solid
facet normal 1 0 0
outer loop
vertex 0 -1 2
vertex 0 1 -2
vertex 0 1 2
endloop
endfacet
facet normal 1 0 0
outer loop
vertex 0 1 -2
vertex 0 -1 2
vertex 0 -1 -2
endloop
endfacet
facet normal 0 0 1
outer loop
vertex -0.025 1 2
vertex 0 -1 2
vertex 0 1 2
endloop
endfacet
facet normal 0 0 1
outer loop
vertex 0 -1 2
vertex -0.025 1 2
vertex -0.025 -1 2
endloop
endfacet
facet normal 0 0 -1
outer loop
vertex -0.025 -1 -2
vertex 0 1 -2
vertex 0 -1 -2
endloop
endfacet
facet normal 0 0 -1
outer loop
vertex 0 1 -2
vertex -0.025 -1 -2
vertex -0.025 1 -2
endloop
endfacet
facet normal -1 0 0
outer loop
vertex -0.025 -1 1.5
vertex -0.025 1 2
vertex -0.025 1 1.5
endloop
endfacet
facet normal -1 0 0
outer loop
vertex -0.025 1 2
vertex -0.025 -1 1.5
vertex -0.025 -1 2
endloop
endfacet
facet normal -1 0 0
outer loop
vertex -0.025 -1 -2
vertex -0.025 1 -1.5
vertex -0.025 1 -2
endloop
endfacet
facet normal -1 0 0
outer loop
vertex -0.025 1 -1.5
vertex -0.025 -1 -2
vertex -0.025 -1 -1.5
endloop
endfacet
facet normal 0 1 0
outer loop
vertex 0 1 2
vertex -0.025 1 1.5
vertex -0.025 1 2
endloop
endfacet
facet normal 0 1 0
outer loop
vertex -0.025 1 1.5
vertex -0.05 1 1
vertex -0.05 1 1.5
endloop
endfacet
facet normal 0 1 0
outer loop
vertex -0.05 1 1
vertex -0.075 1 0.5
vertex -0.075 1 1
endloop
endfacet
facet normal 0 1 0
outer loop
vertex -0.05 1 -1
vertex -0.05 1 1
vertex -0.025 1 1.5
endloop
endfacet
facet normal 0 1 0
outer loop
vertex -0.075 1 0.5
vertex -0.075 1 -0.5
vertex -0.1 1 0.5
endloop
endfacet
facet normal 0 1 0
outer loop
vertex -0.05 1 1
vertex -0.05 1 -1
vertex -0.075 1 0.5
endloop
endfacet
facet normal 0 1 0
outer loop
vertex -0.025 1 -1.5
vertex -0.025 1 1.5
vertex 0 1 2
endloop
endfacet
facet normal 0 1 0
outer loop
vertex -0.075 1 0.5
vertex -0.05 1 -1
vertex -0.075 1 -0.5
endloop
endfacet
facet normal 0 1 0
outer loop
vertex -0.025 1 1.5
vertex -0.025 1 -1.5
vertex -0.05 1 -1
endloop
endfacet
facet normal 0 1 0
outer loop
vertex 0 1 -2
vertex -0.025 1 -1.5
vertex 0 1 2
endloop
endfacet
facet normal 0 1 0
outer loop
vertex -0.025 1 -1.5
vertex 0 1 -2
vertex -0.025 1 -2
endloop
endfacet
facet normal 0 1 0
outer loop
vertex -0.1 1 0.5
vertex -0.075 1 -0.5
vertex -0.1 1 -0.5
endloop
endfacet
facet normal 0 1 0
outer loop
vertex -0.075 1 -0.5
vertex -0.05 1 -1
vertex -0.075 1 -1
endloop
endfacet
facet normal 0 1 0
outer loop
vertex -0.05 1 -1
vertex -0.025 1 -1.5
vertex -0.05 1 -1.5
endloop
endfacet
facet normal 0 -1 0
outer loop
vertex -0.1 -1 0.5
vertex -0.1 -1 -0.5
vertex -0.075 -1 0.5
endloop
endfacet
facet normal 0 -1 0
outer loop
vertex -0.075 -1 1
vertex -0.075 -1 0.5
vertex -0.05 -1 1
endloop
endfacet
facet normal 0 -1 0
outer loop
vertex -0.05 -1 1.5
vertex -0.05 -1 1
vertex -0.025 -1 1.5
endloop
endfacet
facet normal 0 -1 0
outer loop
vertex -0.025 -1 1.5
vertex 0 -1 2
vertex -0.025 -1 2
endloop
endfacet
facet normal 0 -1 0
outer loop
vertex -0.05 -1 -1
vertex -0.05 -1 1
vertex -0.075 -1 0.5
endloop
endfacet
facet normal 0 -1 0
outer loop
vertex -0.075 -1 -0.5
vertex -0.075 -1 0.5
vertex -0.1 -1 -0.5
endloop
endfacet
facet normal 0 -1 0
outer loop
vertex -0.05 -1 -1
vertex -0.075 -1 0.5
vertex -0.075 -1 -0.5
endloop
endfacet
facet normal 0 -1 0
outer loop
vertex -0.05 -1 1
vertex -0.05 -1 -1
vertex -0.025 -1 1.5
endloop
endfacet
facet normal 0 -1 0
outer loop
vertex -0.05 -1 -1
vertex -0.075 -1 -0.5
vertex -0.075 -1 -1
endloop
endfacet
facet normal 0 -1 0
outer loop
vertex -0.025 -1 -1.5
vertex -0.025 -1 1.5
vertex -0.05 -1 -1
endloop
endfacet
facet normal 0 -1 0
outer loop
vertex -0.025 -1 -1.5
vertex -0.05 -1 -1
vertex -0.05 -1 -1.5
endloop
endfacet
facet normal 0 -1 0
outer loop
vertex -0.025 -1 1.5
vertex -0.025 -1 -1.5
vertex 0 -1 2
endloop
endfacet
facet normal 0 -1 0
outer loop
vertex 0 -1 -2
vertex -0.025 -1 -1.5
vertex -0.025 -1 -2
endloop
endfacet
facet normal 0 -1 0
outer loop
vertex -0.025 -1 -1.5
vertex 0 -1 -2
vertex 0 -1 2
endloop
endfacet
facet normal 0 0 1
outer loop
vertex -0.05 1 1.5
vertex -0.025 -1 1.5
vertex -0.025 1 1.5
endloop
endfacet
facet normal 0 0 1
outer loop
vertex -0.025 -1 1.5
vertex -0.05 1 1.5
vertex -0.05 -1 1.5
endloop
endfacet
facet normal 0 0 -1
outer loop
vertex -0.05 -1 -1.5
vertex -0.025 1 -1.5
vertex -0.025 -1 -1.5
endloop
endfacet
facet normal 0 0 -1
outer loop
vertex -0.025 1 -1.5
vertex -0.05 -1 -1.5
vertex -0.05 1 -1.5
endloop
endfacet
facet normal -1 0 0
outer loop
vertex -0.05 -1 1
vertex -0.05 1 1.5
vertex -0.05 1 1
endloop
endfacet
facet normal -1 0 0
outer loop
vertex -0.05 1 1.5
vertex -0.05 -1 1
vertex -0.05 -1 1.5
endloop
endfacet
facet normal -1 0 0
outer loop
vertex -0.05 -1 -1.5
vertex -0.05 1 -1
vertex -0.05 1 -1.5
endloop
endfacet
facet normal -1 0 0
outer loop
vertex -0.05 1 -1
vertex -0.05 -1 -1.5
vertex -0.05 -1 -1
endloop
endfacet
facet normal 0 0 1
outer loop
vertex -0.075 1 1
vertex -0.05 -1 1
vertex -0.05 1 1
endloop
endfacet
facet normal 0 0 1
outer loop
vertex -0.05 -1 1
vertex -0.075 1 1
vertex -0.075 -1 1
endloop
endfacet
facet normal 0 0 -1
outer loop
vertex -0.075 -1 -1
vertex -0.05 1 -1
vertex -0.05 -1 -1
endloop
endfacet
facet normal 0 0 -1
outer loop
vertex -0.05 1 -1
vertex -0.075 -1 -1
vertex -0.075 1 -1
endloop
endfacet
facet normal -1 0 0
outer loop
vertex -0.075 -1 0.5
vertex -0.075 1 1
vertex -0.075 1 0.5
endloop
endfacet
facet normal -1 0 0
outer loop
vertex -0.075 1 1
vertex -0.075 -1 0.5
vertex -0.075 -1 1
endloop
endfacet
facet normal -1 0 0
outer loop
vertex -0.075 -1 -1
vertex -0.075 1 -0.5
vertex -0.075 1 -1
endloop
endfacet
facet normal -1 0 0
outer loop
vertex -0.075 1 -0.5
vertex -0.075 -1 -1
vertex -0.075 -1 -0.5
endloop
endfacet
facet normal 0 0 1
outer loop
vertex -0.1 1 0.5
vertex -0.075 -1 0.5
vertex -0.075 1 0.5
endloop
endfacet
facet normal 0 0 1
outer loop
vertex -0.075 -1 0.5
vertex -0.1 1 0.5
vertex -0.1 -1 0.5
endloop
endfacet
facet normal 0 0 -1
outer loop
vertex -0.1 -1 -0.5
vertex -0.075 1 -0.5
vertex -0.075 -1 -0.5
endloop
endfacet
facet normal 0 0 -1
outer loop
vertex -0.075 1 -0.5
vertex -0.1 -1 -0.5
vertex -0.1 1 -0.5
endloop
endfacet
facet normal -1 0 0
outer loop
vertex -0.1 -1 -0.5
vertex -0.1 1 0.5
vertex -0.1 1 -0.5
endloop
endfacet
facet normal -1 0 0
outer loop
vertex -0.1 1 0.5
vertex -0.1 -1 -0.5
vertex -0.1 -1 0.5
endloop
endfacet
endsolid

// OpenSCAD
dx=0.1; //cm
 scale([0.25,1,1]) union() {
translate([-dx/2,0,0])
    cube([dx,2.0,4.0],center=true);
translate([-3*dx/2,0,0])
    cube([dx,2.0,3.0],center=true);
translate([-5*dx/2,0,0])
    cube([dx,2.0,2.0],center=true);
translate([-7*dx/2,0,0])
    cube([dx,2.0,1.0],center=true);
}
